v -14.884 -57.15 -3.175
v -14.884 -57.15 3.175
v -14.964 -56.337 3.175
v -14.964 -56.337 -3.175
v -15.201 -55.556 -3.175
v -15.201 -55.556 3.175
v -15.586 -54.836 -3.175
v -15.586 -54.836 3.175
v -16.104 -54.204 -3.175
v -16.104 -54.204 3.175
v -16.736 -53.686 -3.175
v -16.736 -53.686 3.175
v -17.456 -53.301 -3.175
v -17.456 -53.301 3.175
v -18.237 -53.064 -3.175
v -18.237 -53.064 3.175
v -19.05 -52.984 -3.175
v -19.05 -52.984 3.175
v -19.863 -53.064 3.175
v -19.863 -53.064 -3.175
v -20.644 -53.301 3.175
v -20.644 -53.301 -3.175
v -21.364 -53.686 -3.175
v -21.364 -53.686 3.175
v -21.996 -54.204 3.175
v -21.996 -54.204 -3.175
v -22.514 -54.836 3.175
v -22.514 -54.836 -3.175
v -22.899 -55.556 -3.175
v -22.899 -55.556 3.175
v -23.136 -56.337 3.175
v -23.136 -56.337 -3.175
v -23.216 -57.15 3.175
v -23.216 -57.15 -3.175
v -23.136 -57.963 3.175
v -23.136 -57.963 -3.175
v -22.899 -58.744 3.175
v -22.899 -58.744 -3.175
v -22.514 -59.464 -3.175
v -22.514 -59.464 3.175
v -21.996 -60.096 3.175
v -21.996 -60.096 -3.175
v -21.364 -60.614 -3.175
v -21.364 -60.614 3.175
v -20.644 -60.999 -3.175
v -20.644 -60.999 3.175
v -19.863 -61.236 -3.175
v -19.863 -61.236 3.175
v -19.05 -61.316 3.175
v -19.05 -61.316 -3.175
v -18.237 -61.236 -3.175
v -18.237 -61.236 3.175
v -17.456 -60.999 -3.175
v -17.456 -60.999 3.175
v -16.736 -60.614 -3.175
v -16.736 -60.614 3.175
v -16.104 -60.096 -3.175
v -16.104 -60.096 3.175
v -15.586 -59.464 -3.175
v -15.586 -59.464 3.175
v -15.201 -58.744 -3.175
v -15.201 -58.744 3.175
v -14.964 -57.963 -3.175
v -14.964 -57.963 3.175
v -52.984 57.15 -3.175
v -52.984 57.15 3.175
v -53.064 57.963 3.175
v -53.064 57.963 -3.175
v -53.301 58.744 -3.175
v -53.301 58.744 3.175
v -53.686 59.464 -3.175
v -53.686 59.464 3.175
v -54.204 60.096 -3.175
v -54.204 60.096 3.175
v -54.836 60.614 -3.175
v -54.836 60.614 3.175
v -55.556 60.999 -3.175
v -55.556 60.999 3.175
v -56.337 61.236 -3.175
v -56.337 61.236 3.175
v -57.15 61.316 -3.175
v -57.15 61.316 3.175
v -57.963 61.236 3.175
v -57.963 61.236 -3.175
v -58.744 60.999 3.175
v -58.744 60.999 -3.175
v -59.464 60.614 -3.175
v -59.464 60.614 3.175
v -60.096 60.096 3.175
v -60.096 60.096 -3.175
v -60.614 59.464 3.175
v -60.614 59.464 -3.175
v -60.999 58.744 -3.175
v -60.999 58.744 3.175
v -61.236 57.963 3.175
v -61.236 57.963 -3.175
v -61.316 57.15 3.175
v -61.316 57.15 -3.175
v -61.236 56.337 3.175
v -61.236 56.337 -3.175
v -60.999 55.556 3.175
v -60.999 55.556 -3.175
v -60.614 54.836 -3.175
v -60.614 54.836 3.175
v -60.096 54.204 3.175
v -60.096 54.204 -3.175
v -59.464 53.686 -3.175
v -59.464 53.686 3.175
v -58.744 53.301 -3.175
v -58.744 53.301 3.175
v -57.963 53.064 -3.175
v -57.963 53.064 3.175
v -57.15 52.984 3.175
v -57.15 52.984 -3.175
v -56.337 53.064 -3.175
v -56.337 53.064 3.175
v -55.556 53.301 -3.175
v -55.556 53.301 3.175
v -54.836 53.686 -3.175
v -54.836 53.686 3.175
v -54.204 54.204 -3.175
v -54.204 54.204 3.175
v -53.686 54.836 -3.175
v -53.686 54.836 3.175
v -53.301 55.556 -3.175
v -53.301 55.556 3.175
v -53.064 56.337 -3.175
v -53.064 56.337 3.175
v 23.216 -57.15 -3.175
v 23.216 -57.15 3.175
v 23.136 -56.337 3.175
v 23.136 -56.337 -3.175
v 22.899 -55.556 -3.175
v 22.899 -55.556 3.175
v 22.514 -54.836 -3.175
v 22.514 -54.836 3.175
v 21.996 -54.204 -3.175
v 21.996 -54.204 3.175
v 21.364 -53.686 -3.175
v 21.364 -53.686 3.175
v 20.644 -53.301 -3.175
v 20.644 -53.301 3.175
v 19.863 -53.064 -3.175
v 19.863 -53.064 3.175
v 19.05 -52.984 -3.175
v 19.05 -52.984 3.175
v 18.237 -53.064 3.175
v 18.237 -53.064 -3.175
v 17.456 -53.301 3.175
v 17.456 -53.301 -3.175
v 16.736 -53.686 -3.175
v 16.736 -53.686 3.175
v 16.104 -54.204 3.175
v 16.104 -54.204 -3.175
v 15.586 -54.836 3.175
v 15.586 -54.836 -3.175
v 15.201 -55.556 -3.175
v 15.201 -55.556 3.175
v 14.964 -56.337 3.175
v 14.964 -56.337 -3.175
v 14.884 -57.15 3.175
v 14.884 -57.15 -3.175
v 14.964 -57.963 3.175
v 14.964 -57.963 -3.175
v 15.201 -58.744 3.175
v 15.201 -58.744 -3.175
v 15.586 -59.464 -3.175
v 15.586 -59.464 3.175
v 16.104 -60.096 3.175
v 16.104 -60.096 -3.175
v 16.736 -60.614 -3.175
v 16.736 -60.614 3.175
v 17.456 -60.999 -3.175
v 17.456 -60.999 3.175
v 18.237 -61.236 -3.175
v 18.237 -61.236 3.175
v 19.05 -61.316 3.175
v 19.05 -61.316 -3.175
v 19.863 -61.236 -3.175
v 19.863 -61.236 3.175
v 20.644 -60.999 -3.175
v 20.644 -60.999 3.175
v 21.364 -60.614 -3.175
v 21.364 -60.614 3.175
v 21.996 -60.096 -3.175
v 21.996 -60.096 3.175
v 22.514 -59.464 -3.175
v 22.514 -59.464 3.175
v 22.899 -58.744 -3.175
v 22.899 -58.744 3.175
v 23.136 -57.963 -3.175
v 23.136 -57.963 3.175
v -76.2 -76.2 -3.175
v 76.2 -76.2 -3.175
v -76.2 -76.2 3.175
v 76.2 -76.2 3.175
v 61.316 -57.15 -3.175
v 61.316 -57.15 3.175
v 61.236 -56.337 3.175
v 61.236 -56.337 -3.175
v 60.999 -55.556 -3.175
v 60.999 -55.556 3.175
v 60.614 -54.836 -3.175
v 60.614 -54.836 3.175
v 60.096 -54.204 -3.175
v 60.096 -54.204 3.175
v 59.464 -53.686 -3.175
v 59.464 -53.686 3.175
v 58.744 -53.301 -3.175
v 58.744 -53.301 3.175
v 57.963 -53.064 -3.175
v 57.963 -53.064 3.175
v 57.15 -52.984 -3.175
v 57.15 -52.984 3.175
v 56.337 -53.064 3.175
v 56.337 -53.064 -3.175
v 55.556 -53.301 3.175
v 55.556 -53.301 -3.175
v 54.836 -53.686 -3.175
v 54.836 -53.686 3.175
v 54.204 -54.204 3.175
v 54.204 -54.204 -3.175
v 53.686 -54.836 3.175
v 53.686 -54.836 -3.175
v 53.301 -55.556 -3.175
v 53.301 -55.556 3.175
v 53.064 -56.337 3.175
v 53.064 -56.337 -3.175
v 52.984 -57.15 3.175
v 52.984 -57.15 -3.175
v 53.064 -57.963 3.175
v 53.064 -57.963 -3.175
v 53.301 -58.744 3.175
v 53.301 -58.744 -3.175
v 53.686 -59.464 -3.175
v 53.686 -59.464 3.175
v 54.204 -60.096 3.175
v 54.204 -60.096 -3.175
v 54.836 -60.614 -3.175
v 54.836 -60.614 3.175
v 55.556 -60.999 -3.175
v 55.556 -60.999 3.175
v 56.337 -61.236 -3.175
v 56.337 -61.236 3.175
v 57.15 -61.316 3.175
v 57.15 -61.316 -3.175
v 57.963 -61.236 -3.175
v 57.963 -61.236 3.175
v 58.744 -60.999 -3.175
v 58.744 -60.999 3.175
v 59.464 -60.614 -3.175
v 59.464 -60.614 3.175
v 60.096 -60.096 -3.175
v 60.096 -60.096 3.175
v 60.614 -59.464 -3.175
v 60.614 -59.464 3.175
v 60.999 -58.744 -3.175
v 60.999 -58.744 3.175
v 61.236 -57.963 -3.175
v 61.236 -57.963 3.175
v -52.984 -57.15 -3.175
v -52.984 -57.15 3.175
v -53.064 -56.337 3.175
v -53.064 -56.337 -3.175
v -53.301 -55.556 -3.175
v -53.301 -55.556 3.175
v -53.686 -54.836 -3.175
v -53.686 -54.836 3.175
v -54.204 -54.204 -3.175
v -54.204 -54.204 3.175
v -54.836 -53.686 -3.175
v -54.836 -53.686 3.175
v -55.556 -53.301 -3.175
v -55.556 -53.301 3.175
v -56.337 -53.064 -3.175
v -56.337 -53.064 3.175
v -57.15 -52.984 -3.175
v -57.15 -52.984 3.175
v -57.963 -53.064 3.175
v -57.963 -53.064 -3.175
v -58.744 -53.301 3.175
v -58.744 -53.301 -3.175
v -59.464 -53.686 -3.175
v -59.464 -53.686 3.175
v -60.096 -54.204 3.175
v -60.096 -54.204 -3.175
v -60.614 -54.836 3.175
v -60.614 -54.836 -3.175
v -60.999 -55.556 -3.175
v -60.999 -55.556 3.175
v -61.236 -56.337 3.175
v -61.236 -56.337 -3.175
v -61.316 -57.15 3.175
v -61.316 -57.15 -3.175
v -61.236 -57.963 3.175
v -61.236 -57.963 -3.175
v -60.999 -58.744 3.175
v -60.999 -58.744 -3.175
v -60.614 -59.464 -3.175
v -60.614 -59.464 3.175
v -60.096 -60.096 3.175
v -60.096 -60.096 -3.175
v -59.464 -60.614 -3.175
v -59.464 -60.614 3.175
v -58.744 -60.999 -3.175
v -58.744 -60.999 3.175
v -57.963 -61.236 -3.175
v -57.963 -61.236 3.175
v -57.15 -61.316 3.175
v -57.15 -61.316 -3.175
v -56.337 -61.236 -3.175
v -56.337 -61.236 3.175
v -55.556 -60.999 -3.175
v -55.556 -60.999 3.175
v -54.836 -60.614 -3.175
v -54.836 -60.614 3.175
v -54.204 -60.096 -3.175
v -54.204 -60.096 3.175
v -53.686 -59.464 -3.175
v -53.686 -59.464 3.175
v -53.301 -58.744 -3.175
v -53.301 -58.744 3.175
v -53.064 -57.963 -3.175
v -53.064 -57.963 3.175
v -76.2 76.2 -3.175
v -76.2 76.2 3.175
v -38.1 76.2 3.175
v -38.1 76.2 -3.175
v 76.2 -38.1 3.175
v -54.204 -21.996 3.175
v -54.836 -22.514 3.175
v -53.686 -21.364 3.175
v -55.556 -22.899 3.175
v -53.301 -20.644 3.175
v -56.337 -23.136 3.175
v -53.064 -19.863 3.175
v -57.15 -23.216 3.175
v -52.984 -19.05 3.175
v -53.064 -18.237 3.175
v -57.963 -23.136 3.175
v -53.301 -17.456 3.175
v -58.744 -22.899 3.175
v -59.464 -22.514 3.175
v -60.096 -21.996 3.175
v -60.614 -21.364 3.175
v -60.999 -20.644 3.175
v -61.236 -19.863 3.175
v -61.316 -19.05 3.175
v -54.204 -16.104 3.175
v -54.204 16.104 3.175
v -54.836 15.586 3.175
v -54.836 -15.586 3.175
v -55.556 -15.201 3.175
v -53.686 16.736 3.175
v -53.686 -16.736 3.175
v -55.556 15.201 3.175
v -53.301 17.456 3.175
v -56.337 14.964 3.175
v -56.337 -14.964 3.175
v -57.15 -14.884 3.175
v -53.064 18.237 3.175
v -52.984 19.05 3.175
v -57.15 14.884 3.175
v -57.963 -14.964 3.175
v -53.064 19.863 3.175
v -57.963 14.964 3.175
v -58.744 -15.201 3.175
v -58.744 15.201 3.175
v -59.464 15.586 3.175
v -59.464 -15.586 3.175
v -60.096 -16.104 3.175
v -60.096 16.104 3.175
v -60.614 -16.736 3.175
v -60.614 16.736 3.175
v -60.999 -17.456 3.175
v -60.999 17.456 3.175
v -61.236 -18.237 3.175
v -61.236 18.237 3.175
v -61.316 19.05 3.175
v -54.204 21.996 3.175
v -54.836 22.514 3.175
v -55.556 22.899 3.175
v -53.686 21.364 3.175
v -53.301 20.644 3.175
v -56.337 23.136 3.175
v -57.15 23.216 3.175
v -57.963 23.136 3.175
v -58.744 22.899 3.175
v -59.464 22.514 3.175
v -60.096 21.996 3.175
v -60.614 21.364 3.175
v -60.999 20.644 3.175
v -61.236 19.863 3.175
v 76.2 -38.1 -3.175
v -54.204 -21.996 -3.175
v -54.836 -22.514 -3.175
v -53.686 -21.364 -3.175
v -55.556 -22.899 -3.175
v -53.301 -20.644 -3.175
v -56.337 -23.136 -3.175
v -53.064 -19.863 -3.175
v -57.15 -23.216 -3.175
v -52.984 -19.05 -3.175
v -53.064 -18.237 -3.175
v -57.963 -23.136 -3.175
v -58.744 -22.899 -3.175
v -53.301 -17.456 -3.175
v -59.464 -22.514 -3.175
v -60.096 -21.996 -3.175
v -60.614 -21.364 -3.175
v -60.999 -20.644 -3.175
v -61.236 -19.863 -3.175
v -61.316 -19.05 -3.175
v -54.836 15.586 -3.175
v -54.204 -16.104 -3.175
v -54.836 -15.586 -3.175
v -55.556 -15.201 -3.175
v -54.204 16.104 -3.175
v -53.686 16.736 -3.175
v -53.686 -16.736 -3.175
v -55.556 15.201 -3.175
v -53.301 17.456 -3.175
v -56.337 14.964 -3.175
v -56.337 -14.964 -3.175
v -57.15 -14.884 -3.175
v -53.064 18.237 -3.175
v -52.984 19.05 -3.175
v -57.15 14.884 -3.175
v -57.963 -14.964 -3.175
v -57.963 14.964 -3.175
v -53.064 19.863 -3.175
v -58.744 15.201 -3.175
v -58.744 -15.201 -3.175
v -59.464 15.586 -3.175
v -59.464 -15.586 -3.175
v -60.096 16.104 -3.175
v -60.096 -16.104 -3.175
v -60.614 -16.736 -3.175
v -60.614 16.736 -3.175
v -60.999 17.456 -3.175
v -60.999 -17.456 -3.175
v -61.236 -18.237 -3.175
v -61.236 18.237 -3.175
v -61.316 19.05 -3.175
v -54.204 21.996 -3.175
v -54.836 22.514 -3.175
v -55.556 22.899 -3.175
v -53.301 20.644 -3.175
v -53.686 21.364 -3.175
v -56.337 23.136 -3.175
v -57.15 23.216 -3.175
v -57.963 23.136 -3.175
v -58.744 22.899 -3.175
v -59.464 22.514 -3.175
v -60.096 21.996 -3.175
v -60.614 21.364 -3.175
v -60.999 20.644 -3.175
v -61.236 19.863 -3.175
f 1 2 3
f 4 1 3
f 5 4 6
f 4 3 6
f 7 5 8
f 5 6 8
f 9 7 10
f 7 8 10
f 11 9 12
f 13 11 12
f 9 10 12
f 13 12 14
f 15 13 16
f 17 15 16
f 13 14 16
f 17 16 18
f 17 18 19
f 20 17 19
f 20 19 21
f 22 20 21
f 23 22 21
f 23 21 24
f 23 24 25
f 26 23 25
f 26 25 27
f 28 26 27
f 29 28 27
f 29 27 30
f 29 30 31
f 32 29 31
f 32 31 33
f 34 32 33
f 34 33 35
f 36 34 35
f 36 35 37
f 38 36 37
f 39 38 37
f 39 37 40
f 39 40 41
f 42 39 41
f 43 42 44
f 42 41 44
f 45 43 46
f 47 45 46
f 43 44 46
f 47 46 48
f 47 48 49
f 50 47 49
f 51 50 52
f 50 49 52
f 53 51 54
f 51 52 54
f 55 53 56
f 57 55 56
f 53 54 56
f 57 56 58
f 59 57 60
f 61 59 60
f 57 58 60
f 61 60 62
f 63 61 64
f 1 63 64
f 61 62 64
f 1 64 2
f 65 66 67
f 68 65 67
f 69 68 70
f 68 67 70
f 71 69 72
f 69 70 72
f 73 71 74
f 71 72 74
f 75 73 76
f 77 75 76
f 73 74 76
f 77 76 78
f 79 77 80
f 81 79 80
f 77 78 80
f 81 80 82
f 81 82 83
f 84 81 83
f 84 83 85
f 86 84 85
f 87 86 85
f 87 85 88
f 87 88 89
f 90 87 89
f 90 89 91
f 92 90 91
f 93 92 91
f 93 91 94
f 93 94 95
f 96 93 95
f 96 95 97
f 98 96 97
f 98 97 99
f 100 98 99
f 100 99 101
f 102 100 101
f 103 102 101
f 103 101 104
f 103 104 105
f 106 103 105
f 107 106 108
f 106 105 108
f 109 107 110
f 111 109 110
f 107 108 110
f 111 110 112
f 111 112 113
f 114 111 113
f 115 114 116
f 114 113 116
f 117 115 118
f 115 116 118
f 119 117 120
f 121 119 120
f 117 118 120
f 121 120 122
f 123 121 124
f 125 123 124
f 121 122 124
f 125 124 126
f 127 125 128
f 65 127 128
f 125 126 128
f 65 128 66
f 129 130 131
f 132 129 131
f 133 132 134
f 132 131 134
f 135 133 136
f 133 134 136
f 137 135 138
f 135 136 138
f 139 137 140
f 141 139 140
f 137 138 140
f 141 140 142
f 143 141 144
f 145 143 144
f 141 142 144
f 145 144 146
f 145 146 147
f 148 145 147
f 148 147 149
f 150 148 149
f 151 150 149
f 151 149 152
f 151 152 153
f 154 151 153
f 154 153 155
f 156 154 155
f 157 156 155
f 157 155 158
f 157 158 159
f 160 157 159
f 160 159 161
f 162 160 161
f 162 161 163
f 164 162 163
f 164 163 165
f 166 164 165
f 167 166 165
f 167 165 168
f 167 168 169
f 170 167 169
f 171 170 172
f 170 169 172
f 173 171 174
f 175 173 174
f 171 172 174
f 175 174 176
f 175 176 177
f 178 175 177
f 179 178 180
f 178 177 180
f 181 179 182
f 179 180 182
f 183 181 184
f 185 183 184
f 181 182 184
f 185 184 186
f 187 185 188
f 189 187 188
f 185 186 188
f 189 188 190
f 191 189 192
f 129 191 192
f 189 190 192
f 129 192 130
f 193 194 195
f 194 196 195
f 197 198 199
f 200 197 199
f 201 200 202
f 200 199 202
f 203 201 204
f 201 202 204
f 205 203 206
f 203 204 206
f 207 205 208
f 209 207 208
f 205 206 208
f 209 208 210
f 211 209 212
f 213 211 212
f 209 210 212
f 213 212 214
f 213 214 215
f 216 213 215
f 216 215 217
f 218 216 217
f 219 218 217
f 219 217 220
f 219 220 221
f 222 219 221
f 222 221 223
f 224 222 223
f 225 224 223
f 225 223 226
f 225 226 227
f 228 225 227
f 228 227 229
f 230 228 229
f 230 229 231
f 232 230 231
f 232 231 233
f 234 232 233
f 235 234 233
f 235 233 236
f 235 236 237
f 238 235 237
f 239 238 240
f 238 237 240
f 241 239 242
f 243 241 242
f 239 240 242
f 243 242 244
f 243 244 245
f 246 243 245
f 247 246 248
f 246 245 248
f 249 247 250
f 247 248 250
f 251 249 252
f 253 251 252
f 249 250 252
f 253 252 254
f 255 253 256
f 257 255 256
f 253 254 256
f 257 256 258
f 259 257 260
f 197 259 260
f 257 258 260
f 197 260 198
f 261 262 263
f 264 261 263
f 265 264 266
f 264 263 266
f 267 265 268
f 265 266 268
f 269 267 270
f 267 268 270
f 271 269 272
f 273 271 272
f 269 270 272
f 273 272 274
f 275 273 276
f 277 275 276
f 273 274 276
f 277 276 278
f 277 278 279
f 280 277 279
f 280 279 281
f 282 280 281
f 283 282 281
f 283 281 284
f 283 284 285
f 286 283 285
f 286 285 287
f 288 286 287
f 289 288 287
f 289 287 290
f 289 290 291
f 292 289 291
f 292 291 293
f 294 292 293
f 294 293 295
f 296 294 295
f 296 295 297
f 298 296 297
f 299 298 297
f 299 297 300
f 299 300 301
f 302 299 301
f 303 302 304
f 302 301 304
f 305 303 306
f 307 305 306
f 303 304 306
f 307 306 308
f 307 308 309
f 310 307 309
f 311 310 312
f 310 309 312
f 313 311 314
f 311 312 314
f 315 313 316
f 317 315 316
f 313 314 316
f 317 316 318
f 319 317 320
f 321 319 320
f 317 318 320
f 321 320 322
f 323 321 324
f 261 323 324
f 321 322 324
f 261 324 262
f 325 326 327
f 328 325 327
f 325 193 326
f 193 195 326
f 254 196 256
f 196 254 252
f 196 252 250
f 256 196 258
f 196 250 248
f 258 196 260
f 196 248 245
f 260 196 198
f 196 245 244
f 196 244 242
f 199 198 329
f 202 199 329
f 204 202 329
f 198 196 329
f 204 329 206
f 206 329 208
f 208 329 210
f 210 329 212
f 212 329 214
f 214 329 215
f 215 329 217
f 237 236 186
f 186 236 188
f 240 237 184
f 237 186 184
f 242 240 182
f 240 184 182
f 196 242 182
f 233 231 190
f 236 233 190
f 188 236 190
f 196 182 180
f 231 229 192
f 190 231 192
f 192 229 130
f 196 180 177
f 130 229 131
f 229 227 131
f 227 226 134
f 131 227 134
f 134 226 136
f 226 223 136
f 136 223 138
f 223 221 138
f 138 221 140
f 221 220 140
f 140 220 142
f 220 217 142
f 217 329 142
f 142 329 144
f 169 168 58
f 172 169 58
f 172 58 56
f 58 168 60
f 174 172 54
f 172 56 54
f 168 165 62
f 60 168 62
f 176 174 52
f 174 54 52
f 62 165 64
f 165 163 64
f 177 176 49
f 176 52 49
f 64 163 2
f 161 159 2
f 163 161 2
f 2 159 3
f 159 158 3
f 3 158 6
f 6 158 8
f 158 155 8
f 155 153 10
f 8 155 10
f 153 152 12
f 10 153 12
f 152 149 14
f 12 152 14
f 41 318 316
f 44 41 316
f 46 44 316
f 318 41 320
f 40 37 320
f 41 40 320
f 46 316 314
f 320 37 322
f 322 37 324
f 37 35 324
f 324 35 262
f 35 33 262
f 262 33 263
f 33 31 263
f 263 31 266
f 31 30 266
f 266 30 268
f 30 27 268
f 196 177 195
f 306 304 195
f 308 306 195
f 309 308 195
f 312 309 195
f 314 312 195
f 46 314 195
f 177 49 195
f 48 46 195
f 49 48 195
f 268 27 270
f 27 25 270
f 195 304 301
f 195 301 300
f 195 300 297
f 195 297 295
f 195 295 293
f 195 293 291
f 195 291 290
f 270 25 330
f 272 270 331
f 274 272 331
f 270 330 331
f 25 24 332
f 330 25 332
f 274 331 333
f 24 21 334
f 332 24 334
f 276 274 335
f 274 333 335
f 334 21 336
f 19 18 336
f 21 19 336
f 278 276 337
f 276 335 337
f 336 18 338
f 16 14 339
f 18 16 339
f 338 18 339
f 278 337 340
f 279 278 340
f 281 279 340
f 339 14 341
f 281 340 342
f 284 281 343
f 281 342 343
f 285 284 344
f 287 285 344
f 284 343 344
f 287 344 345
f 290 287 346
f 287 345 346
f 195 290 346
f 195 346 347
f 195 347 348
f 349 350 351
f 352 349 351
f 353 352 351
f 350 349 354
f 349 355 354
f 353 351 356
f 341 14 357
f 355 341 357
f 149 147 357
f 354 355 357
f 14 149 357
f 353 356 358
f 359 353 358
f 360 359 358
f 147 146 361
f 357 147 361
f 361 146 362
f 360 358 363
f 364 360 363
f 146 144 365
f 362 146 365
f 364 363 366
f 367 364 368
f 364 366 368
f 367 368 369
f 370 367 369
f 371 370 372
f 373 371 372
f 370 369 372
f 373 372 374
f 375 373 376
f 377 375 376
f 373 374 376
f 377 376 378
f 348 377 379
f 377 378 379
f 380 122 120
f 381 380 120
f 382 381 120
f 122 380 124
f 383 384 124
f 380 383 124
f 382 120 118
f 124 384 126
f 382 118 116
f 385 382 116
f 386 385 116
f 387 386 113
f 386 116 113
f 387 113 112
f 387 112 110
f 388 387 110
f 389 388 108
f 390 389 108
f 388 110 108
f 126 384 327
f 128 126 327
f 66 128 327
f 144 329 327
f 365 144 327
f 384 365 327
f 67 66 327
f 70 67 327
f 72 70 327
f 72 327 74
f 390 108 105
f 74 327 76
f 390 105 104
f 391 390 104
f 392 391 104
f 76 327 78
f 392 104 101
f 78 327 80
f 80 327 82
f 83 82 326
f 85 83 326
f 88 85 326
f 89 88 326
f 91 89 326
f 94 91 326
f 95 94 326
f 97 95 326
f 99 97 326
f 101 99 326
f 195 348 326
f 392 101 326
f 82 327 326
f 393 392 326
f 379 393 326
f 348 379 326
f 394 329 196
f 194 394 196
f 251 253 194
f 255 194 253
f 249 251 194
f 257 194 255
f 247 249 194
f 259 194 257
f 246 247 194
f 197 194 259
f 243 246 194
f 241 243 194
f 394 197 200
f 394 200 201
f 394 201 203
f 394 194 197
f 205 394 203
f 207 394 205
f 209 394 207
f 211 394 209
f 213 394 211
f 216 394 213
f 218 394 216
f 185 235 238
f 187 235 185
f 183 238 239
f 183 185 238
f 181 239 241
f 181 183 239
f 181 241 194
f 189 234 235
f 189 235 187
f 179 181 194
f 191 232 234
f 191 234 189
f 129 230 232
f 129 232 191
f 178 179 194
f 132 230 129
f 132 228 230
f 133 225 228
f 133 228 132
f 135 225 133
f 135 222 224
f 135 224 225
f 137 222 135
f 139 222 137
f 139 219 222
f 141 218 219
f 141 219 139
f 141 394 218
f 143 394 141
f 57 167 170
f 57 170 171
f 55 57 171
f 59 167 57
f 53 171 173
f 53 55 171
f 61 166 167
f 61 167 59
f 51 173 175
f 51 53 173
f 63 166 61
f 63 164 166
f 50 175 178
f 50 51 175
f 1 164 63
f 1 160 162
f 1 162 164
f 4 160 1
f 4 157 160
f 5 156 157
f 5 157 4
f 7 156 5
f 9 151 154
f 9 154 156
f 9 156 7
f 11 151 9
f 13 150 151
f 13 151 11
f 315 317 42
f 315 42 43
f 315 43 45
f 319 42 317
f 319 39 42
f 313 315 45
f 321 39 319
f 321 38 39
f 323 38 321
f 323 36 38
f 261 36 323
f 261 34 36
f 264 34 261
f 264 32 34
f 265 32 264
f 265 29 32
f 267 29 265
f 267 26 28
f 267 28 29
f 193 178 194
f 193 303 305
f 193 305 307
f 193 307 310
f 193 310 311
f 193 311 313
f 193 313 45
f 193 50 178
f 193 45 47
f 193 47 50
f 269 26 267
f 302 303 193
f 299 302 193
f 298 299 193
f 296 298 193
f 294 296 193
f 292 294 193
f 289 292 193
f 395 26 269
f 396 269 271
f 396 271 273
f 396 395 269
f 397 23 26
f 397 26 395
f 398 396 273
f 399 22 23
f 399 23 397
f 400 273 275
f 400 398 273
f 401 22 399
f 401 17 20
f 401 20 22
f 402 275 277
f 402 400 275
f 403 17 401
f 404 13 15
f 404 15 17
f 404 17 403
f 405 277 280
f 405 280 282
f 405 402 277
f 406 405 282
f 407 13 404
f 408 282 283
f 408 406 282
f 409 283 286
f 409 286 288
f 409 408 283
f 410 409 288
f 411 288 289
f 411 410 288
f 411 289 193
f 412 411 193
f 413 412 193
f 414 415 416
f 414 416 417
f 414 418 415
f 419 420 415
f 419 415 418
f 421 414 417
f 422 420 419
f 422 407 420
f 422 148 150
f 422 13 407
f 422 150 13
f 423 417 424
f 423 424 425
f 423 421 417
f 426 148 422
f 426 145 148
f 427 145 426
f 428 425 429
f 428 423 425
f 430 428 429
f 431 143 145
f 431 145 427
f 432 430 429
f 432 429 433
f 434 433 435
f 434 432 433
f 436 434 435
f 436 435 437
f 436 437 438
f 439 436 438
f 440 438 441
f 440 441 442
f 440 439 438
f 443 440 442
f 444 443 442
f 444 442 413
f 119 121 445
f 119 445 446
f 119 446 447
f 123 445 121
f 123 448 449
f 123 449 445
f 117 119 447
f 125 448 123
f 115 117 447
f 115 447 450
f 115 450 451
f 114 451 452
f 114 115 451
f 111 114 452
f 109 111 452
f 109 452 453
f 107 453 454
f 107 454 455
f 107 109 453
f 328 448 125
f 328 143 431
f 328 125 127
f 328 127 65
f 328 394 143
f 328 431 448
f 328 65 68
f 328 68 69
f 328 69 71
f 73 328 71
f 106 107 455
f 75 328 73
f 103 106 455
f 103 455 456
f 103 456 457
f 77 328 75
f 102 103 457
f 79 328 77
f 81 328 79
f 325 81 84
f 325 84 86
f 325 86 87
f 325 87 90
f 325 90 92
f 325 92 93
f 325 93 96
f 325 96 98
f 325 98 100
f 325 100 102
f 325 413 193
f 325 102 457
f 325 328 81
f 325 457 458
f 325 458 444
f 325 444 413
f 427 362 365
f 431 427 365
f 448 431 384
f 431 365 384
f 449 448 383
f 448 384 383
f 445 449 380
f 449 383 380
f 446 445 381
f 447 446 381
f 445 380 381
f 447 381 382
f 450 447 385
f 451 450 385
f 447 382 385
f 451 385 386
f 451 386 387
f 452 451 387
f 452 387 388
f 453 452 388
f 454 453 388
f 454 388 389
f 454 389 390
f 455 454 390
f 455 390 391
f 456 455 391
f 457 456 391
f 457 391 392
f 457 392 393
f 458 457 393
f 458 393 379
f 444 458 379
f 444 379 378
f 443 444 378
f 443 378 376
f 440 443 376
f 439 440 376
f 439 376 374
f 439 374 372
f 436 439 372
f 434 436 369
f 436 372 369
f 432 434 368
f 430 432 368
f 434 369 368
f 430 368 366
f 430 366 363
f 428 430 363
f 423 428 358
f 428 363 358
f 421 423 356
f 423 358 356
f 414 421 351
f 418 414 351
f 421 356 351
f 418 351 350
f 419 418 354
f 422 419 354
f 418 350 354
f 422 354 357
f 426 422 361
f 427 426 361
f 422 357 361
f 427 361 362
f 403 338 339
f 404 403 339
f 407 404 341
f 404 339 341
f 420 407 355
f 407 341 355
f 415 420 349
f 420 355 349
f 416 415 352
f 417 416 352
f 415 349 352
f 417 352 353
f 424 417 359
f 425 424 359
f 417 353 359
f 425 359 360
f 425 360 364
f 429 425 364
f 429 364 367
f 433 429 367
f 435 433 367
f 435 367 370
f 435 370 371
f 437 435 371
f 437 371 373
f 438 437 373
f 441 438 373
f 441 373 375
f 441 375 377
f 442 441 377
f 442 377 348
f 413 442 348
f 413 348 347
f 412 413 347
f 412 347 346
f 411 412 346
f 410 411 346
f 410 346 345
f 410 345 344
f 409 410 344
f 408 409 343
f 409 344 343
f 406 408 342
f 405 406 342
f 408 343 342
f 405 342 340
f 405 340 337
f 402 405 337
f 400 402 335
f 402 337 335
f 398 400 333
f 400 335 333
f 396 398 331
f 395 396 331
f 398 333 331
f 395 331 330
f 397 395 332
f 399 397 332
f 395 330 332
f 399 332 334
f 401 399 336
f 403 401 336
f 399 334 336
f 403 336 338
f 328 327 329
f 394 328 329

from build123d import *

# Parameters (mm, degrees)
BOSS_EXTRUDE1_DEPTH      = 3.175
BOSS_EXTRUDE1_DEPTH_BACK = 3.175
SKETCH4_R                = 4.1656
CUT_EXTRUDE1_DEPTH       = 7.35


with BuildPart() as part:
    # Sketch3 → Boss-Extrude1 (new body, two sides)
    with BuildSketch(Plane.XY) as boss_extrude1_sk:
        Polygon((76.2, -38.1), (76.2, -76.2), (-76.2, -76.2), (-76.2, 76.2), (-38.1, 76.2), align=None)
    extrude(amount=BOSS_EXTRUDE1_DEPTH)
    extrude(boss_extrude1_sk.sketch, amount=-BOSS_EXTRUDE1_DEPTH_BACK)

    # Sketch4 → Cut-Extrude1 (cut, through all)
    with BuildSketch(Plane.XY.offset(3.175)):
        with Locations((-57.15, -57.15)):
            Circle(SKETCH4_R)
        with Locations((-19.05, -57.15)):
            Circle(SKETCH4_R)
        with Locations((19.05, -57.15)):
            Circle(SKETCH4_R)
        with Locations((-57.15, -19.05)):
            Circle(SKETCH4_R)
        with Locations((-57.15, 19.05)):
            Circle(SKETCH4_R)
        with Locations((57.15, -57.15)):
            Circle(SKETCH4_R)
        with Locations((-57.15, 57.15)):
            Circle(SKETCH4_R)
    extrude(amount=-CUT_EXTRUDE1_DEPTH, mode=Mode.SUBTRACT)


solid = part.part
